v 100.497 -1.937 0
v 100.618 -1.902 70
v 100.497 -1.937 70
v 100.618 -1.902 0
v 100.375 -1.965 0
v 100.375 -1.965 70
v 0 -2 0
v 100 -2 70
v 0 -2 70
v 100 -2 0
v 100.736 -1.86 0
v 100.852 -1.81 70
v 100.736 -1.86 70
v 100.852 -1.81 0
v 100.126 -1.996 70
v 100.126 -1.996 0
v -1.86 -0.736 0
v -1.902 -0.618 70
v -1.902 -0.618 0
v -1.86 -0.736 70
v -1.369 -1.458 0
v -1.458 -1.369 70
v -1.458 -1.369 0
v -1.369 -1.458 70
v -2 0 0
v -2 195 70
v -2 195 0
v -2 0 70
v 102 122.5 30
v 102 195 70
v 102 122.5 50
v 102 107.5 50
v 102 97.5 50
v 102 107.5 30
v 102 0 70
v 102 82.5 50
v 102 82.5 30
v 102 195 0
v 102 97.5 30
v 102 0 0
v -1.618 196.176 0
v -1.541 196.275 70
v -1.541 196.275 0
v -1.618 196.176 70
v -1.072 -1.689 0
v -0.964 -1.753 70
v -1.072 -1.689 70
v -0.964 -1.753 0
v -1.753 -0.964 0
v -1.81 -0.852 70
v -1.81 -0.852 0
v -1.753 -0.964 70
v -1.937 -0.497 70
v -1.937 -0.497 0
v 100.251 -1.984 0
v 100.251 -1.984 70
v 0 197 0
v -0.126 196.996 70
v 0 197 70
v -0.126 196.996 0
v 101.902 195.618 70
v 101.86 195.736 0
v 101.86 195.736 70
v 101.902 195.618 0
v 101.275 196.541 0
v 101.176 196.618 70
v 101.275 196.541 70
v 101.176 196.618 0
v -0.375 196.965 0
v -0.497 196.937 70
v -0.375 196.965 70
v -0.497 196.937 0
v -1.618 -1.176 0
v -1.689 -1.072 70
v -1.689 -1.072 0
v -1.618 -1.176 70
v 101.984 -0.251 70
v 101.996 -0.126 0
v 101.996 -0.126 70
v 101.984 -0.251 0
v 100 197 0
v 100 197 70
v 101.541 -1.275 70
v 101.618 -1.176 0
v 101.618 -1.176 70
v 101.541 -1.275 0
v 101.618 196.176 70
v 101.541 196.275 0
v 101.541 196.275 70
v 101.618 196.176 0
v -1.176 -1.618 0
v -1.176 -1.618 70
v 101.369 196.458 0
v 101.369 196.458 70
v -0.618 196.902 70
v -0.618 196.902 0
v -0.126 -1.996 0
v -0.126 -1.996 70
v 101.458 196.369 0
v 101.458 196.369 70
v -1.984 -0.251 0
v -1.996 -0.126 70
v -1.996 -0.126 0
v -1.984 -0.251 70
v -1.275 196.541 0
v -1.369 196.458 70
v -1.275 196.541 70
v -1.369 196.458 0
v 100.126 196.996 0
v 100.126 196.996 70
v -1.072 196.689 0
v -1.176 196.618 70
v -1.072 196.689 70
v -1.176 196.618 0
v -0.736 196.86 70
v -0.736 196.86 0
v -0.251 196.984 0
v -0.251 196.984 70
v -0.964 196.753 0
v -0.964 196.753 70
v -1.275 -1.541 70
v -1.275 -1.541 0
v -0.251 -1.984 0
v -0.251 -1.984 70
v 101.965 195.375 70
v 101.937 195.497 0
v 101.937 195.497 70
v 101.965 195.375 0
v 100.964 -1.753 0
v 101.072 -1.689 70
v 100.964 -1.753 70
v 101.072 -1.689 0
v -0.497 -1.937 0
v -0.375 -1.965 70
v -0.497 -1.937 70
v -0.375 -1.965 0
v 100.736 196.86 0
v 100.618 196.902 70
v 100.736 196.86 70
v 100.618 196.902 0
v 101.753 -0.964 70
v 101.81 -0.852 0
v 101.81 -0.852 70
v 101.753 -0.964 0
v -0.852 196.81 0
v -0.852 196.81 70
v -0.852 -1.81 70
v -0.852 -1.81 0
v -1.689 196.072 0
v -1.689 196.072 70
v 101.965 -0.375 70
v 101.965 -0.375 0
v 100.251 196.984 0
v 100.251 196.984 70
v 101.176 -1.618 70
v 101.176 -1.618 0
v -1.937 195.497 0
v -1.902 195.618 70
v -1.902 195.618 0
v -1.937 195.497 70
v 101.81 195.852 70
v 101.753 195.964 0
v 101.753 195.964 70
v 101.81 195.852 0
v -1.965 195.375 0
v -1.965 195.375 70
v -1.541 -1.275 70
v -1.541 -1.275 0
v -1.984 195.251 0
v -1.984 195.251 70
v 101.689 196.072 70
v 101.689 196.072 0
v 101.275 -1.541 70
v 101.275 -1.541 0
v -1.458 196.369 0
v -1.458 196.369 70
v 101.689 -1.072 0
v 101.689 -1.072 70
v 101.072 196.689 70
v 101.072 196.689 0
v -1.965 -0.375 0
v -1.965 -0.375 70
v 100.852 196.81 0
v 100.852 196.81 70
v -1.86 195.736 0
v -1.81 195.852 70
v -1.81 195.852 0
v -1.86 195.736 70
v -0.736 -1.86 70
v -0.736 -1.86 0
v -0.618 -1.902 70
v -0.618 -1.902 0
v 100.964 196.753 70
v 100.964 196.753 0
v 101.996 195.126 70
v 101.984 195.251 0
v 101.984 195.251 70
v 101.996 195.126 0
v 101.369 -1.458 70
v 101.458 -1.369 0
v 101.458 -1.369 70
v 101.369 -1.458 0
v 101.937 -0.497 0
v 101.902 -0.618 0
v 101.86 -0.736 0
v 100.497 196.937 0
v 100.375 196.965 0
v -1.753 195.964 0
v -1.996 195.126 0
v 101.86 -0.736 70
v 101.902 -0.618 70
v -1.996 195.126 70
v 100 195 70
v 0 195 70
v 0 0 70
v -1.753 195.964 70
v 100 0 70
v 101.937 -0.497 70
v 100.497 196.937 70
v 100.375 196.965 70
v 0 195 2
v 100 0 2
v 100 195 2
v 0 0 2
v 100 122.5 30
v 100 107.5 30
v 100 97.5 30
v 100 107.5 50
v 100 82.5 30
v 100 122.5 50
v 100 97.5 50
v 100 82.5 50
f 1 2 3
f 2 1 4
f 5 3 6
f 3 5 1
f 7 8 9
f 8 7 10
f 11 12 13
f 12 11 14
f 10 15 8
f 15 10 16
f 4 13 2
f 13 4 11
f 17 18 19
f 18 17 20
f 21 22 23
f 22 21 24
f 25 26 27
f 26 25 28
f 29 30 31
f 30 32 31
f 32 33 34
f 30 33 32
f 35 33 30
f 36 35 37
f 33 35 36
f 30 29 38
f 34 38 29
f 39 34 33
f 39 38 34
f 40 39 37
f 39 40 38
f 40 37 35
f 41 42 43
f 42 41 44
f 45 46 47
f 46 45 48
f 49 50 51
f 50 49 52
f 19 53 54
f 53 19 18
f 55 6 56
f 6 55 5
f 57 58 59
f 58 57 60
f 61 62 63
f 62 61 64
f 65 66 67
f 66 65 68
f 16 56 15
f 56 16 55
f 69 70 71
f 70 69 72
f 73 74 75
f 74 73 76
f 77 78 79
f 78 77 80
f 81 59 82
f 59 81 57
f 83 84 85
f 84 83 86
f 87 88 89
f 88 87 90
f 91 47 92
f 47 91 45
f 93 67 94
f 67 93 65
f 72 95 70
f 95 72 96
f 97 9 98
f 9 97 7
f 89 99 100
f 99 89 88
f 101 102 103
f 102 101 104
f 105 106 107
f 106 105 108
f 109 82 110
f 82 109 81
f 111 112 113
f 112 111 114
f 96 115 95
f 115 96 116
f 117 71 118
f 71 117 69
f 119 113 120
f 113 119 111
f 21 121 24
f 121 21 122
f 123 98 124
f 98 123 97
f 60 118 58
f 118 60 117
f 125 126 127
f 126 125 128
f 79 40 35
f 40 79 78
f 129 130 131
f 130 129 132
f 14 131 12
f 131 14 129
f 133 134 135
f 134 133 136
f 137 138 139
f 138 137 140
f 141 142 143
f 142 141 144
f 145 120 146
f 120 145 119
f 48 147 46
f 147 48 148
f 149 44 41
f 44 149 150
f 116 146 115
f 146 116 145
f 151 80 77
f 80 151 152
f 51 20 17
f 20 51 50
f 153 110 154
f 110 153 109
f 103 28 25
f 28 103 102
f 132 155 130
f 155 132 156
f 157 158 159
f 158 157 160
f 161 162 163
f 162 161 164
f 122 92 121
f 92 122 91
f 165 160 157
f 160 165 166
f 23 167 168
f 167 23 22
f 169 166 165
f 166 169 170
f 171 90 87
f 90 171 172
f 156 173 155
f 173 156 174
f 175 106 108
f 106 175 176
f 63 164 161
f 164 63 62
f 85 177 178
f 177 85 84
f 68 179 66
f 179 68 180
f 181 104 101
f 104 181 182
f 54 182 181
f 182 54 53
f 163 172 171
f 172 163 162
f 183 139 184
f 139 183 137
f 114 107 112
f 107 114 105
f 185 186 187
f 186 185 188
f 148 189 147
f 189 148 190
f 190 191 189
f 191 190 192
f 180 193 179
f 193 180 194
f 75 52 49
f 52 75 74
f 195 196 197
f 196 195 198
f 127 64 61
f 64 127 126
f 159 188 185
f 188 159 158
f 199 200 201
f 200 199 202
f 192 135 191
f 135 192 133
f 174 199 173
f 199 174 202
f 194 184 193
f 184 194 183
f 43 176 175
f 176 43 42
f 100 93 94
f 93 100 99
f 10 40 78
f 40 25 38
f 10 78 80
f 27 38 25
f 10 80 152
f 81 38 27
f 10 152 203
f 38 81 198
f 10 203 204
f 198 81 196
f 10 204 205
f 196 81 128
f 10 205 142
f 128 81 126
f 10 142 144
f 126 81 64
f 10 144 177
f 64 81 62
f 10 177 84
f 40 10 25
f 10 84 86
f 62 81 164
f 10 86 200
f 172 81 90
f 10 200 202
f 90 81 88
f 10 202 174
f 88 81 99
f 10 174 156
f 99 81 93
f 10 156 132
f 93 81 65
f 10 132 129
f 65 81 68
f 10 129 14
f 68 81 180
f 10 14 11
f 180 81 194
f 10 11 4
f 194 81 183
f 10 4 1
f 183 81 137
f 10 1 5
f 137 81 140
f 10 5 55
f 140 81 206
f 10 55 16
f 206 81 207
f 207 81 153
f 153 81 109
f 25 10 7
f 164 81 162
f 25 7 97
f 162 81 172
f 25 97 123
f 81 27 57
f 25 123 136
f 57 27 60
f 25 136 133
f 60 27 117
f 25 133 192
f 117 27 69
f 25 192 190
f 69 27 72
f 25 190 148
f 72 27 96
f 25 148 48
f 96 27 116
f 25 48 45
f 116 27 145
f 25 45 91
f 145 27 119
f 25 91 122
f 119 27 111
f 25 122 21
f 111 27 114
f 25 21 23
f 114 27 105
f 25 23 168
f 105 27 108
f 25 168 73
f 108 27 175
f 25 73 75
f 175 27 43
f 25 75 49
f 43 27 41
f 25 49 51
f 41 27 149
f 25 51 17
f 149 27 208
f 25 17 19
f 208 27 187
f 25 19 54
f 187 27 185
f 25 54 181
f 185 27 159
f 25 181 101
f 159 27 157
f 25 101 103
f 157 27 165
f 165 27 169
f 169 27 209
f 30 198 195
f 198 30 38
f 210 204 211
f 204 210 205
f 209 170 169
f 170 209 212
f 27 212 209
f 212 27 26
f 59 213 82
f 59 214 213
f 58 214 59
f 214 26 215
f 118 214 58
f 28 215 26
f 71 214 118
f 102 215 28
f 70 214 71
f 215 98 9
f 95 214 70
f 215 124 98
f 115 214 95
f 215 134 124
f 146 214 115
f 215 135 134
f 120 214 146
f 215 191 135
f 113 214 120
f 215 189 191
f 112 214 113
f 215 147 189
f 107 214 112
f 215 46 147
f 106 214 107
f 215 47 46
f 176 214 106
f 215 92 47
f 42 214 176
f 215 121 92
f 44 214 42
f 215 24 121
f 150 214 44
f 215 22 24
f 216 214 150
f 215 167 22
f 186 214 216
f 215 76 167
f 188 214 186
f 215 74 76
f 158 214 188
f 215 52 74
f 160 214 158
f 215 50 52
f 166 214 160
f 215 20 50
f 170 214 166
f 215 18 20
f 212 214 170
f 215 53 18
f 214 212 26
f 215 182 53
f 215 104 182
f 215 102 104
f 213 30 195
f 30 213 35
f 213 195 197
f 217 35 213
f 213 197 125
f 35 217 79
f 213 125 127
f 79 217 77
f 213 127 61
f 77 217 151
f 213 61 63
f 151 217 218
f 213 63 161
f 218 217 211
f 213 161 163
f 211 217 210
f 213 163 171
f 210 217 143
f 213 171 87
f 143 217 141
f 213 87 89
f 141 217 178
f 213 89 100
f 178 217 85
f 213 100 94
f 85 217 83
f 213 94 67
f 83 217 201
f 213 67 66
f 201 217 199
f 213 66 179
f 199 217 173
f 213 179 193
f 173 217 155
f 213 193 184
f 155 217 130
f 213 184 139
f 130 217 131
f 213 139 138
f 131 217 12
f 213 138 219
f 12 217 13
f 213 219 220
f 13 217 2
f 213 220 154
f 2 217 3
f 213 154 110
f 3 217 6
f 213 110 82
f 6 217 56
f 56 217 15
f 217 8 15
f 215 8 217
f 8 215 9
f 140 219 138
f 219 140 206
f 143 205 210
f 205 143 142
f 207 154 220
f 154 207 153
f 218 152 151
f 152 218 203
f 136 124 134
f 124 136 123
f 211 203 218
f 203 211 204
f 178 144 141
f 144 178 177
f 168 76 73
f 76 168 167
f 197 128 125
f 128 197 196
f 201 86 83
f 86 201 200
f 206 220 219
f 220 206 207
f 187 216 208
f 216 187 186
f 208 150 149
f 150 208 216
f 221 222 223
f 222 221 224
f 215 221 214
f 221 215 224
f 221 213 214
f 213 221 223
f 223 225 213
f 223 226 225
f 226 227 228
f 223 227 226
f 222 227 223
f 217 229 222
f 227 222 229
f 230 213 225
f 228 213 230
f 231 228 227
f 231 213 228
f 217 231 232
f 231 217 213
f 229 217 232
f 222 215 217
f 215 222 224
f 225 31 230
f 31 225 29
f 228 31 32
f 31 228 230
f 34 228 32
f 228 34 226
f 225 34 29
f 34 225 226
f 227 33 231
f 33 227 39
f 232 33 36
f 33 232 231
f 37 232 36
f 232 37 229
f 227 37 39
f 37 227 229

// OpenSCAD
// file: includes.scad
$fn=100;
button_hole=29;
button_gap=10;
led_hole=5.5;
box_height=70;
box_depth=100;
box_thickness=2;
port_height=20;
port_width=15;

button_width=((button_hole+button_gap)*5);
module top_plate(){square([box_depth,button_width]);}
// main file
include<includes.scad>
  
difference(){
difference()
{
    linear_extrude(box_height)
offset(box_thickness)
top_plate();
   translate([0,0,box_thickness])
linear_extrude(box_height)
top_plate();
}
{
translate([box_depth-5,(button_width/2)-port_width,(box_height)-(port_height)])
rotate([0,90,0])
{
    linear_extrude(20)
    {translate([0,port_height+5,0])
    square([port_height,port_width]);
    square([port_height,port_width]);}
}
}}
